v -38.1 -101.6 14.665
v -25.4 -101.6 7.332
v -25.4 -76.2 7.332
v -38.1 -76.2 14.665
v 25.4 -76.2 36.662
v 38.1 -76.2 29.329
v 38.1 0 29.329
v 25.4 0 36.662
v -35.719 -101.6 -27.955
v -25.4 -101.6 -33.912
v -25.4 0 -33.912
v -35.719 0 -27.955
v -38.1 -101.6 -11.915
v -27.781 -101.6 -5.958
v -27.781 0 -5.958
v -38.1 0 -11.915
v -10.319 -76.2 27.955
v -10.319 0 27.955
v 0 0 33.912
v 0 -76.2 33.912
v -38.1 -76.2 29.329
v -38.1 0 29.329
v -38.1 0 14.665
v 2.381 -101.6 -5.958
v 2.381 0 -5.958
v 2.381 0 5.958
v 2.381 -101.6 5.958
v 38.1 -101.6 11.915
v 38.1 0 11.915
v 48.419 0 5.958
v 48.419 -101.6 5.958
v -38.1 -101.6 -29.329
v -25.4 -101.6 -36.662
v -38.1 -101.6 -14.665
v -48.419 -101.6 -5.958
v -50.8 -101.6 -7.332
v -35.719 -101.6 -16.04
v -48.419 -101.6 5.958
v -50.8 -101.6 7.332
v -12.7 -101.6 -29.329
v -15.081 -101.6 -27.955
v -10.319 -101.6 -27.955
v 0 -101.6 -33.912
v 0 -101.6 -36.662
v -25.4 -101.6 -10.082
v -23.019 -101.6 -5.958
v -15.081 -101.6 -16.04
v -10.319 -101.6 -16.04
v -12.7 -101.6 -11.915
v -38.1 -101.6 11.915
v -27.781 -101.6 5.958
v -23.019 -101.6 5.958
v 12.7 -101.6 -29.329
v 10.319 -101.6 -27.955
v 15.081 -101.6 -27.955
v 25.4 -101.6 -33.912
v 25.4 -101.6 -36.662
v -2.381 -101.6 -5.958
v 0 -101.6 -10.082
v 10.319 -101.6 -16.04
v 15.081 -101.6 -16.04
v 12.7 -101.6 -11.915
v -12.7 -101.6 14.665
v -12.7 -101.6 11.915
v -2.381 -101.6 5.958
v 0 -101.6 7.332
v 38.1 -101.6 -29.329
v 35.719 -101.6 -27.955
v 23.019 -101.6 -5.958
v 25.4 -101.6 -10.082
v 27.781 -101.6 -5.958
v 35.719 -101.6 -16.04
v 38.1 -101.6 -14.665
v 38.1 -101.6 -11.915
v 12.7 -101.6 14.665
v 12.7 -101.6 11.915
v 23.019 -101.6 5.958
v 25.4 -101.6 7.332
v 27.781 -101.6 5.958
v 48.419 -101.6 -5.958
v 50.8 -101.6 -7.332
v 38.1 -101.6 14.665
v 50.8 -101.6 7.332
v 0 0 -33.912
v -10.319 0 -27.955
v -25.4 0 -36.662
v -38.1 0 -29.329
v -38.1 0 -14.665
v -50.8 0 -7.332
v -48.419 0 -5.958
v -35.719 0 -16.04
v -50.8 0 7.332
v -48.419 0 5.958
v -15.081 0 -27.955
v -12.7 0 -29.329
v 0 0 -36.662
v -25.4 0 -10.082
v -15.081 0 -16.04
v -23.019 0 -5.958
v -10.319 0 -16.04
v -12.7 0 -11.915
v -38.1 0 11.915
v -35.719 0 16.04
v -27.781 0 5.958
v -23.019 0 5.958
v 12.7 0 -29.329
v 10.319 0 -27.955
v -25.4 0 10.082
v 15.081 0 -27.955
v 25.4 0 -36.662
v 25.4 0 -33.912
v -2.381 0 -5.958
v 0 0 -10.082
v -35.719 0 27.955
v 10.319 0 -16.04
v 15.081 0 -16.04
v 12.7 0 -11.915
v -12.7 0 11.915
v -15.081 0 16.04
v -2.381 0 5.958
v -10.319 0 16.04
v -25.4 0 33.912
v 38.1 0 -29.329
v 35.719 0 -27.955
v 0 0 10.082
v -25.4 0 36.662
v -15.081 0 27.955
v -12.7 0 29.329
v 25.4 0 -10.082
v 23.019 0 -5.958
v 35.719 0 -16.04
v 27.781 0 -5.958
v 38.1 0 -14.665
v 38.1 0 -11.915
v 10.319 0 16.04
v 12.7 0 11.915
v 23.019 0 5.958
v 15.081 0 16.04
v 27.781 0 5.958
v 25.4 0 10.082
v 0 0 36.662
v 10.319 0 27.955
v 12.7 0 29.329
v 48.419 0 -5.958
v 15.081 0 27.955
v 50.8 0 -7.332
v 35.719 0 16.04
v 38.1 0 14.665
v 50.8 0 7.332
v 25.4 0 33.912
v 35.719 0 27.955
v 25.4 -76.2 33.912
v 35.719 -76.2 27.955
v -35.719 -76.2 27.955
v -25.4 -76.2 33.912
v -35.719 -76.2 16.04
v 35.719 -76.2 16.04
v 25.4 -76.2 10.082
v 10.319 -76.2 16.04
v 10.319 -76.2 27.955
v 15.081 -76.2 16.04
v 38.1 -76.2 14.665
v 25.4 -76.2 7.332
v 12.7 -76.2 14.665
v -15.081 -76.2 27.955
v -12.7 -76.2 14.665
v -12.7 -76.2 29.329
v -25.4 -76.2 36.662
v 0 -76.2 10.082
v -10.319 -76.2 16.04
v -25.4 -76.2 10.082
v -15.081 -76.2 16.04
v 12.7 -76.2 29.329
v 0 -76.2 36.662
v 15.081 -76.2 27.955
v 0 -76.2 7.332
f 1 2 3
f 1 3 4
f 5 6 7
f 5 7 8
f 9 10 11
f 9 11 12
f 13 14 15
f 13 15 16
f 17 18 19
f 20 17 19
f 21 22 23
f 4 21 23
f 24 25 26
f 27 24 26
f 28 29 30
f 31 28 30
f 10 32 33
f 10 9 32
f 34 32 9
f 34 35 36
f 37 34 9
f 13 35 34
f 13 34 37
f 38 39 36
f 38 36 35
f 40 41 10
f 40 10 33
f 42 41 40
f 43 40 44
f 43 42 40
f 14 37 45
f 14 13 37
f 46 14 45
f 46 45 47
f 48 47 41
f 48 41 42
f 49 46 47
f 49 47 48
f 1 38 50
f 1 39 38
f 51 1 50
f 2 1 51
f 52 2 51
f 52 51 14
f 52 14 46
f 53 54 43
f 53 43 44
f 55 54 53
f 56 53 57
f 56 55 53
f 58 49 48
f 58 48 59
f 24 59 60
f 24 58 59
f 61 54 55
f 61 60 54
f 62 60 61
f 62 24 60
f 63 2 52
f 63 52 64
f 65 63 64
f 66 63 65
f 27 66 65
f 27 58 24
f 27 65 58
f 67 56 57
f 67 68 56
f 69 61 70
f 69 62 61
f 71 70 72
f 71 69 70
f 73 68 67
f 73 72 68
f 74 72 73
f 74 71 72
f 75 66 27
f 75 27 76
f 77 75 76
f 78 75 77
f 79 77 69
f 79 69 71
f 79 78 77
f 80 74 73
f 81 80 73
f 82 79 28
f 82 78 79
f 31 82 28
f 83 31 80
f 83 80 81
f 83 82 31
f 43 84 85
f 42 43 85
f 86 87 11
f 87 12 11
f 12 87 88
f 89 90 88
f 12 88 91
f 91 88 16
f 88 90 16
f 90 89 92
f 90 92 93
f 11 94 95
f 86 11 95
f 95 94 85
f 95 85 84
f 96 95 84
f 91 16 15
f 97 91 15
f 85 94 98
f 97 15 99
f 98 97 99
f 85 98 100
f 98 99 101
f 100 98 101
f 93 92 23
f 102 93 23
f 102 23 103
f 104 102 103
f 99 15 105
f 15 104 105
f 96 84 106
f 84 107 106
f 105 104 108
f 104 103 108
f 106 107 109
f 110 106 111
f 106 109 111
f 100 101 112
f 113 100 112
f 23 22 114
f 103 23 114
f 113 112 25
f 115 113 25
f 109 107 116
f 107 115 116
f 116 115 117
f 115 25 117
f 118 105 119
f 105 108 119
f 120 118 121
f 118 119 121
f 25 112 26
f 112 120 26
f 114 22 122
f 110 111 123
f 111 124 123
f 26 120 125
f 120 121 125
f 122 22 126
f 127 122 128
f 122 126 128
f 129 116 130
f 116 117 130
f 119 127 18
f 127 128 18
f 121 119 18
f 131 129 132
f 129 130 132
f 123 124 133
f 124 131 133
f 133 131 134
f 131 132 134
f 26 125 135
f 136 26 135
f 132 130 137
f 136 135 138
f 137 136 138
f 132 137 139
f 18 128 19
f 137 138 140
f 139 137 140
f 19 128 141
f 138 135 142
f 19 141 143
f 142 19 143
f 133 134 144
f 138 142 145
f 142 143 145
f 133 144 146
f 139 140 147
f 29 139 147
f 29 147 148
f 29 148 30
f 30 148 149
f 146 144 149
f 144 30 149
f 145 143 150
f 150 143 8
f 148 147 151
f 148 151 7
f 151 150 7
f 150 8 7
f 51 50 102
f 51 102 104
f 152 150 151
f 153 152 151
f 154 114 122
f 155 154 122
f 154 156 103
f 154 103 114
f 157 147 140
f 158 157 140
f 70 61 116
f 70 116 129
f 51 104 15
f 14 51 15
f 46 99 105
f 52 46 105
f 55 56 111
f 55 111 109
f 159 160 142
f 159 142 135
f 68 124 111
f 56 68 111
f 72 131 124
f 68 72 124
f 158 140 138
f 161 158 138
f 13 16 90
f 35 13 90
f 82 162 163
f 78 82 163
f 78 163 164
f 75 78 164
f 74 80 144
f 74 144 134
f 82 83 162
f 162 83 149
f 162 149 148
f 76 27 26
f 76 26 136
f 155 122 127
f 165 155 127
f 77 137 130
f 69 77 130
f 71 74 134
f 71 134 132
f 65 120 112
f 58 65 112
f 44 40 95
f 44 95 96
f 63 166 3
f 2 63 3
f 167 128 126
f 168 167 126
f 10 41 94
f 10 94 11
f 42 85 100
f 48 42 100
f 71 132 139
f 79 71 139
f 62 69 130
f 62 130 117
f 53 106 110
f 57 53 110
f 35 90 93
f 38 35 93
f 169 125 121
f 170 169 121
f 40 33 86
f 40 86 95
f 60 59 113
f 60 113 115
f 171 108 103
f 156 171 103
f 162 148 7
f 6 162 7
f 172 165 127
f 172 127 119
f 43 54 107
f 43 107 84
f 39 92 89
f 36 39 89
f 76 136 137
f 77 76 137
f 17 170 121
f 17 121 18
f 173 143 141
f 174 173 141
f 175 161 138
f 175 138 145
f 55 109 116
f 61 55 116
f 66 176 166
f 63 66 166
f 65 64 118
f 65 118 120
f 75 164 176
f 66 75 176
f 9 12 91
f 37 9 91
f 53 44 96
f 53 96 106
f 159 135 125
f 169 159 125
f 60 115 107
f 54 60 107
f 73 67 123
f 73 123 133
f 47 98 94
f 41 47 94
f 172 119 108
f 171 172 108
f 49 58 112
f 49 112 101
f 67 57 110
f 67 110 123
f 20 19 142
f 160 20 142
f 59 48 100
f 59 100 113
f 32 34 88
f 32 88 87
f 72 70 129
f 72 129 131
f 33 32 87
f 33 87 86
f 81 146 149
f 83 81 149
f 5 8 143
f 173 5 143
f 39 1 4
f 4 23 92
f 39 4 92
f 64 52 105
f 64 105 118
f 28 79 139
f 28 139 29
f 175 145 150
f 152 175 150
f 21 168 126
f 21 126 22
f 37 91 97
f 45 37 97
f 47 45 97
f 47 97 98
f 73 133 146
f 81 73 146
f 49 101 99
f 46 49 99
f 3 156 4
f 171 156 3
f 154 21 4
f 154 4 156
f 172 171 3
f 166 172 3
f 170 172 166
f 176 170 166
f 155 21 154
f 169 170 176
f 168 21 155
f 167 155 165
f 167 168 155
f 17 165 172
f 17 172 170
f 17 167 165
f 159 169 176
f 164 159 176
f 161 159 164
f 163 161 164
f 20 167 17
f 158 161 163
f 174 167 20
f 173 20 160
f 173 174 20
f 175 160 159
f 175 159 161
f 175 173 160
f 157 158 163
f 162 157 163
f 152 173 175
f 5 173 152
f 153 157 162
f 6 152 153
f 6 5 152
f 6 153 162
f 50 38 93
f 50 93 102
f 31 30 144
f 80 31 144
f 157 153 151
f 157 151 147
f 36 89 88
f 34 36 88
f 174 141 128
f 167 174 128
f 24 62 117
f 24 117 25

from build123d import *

# Parameters (mm, degrees)
F1_DEPTH = 101.6
F2_DEPTH = 76.2


with BuildPart() as f1:
    # F0 (on Front) → F1 (new body)
    with BuildSketch(Plane.XZ):
        Polygon((-38.1, 14.664697), (-50.8, 7.332348), (-50.8, 0), (-50.8, -7.332348), (-38.1, -14.664697), (-38.1, -29.329394), (-25.4, -36.661742), (-12.7, -29.329394), (0, -36.661742), (12.7, -29.329394), (25.4, -36.661742), (38.1, -29.329394), (38.1, -14.664697), (50.8, -7.332348), (50.8, 0), (50.8, 7.332348), (38.1, 14.664697), (25.4, 7.332348), (12.7, 14.664697), (0, 7.332348), (-12.7, 14.664697), (-25.4, 7.332348), align=None)
        Polygon((-15.08125, -27.954578), (-25.4, -33.912111), (-35.71875, -27.954578), (-35.71875, -16.039512), (-25.4, -10.081979), (-15.08125, -16.039512), align=None, mode=Mode.SUBTRACT)
        Polygon((-10.31875, -16.039512), (0, -10.081979), (10.31875, -16.039512), (10.31875, -27.954578), (0, -33.912111), (-10.31875, -27.954578), align=None, mode=Mode.SUBTRACT)
        Polygon((-48.41875, 0), (-48.41875, 5.957533), (-38.1, 11.915066), (-27.78125, 5.957533), (-27.78125, 0), (-27.78125, -5.957533), (-38.1, -11.915066), (-48.41875, -5.957533), align=None, mode=Mode.SUBTRACT)
        Polygon((25.4, -10.081979), (35.71875, -16.039512), (35.71875, -27.954578), (25.4, -33.912111), (15.08125, -27.954578), (15.08125, -16.039512), align=None, mode=Mode.SUBTRACT)
        Polygon((48.41875, 0), (48.41875, -5.957533), (38.1, -11.915066), (27.78125, -5.957533), (27.78125, 0), (27.78125, 5.957533), (38.1, 11.915066), (48.41875, 5.957533), align=None, mode=Mode.SUBTRACT)
        Polygon((-12.7, 11.915066), (-2.38125, 5.957533), (-2.38125, 0), (-2.38125, -5.957533), (-12.7, -11.915066), (-23.01875, -5.957533), (-23.01875, 0), (-23.01875, 5.957533), align=None, mode=Mode.SUBTRACT)
        Polygon((23.01875, 5.957533), (23.01875, 0), (23.01875, -5.957533), (12.7, -11.915066), (2.38125, -5.957533), (2.38125, 0), (2.38125, 5.957533), (12.7, 11.915066), align=None, mode=Mode.SUBTRACT)
    extrude(amount=F1_DEPTH)

    # F0 (on Front) → F2 (join)
    with BuildSketch(Plane.XZ):
        Polygon((-38.1, 29.329394), (-38.1, 14.664697), (-25.4, 7.332348), (-12.7, 14.664697), (-12.7, 29.329394), (-25.4, 36.661742), align=None)
        Polygon((-15.08125, 27.954578), (-15.08125, 16.039512), (-25.4, 10.081979), (-35.71875, 16.039512), (-35.71875, 27.954578), (-25.4, 33.912111), align=None, mode=Mode.SUBTRACT)
        Polygon((-12.7, 29.329394), (-12.7, 14.664697), (0, 7.332348), (12.7, 14.664697), (12.7, 29.329394), (0, 36.661742), align=None)
        Polygon((-10.31875, 16.039512), (-10.31875, 27.954578), (0, 33.912111), (10.31875, 27.954578), (10.31875, 16.039512), (0, 10.081979), align=None, mode=Mode.SUBTRACT)
        Polygon((12.7, 29.329394), (12.7, 14.664697), (25.4, 7.332348), (38.1, 14.664697), (38.1, 29.329394), (25.4, 36.661742), align=None)
        Polygon((15.08125, 16.039512), (15.08125, 27.954578), (25.4, 33.912111), (35.71875, 27.954578), (35.71875, 16.039512), (25.4, 10.081979), align=None, mode=Mode.SUBTRACT)
    extrude(amount=F2_DEPTH)


solid = f1.part
